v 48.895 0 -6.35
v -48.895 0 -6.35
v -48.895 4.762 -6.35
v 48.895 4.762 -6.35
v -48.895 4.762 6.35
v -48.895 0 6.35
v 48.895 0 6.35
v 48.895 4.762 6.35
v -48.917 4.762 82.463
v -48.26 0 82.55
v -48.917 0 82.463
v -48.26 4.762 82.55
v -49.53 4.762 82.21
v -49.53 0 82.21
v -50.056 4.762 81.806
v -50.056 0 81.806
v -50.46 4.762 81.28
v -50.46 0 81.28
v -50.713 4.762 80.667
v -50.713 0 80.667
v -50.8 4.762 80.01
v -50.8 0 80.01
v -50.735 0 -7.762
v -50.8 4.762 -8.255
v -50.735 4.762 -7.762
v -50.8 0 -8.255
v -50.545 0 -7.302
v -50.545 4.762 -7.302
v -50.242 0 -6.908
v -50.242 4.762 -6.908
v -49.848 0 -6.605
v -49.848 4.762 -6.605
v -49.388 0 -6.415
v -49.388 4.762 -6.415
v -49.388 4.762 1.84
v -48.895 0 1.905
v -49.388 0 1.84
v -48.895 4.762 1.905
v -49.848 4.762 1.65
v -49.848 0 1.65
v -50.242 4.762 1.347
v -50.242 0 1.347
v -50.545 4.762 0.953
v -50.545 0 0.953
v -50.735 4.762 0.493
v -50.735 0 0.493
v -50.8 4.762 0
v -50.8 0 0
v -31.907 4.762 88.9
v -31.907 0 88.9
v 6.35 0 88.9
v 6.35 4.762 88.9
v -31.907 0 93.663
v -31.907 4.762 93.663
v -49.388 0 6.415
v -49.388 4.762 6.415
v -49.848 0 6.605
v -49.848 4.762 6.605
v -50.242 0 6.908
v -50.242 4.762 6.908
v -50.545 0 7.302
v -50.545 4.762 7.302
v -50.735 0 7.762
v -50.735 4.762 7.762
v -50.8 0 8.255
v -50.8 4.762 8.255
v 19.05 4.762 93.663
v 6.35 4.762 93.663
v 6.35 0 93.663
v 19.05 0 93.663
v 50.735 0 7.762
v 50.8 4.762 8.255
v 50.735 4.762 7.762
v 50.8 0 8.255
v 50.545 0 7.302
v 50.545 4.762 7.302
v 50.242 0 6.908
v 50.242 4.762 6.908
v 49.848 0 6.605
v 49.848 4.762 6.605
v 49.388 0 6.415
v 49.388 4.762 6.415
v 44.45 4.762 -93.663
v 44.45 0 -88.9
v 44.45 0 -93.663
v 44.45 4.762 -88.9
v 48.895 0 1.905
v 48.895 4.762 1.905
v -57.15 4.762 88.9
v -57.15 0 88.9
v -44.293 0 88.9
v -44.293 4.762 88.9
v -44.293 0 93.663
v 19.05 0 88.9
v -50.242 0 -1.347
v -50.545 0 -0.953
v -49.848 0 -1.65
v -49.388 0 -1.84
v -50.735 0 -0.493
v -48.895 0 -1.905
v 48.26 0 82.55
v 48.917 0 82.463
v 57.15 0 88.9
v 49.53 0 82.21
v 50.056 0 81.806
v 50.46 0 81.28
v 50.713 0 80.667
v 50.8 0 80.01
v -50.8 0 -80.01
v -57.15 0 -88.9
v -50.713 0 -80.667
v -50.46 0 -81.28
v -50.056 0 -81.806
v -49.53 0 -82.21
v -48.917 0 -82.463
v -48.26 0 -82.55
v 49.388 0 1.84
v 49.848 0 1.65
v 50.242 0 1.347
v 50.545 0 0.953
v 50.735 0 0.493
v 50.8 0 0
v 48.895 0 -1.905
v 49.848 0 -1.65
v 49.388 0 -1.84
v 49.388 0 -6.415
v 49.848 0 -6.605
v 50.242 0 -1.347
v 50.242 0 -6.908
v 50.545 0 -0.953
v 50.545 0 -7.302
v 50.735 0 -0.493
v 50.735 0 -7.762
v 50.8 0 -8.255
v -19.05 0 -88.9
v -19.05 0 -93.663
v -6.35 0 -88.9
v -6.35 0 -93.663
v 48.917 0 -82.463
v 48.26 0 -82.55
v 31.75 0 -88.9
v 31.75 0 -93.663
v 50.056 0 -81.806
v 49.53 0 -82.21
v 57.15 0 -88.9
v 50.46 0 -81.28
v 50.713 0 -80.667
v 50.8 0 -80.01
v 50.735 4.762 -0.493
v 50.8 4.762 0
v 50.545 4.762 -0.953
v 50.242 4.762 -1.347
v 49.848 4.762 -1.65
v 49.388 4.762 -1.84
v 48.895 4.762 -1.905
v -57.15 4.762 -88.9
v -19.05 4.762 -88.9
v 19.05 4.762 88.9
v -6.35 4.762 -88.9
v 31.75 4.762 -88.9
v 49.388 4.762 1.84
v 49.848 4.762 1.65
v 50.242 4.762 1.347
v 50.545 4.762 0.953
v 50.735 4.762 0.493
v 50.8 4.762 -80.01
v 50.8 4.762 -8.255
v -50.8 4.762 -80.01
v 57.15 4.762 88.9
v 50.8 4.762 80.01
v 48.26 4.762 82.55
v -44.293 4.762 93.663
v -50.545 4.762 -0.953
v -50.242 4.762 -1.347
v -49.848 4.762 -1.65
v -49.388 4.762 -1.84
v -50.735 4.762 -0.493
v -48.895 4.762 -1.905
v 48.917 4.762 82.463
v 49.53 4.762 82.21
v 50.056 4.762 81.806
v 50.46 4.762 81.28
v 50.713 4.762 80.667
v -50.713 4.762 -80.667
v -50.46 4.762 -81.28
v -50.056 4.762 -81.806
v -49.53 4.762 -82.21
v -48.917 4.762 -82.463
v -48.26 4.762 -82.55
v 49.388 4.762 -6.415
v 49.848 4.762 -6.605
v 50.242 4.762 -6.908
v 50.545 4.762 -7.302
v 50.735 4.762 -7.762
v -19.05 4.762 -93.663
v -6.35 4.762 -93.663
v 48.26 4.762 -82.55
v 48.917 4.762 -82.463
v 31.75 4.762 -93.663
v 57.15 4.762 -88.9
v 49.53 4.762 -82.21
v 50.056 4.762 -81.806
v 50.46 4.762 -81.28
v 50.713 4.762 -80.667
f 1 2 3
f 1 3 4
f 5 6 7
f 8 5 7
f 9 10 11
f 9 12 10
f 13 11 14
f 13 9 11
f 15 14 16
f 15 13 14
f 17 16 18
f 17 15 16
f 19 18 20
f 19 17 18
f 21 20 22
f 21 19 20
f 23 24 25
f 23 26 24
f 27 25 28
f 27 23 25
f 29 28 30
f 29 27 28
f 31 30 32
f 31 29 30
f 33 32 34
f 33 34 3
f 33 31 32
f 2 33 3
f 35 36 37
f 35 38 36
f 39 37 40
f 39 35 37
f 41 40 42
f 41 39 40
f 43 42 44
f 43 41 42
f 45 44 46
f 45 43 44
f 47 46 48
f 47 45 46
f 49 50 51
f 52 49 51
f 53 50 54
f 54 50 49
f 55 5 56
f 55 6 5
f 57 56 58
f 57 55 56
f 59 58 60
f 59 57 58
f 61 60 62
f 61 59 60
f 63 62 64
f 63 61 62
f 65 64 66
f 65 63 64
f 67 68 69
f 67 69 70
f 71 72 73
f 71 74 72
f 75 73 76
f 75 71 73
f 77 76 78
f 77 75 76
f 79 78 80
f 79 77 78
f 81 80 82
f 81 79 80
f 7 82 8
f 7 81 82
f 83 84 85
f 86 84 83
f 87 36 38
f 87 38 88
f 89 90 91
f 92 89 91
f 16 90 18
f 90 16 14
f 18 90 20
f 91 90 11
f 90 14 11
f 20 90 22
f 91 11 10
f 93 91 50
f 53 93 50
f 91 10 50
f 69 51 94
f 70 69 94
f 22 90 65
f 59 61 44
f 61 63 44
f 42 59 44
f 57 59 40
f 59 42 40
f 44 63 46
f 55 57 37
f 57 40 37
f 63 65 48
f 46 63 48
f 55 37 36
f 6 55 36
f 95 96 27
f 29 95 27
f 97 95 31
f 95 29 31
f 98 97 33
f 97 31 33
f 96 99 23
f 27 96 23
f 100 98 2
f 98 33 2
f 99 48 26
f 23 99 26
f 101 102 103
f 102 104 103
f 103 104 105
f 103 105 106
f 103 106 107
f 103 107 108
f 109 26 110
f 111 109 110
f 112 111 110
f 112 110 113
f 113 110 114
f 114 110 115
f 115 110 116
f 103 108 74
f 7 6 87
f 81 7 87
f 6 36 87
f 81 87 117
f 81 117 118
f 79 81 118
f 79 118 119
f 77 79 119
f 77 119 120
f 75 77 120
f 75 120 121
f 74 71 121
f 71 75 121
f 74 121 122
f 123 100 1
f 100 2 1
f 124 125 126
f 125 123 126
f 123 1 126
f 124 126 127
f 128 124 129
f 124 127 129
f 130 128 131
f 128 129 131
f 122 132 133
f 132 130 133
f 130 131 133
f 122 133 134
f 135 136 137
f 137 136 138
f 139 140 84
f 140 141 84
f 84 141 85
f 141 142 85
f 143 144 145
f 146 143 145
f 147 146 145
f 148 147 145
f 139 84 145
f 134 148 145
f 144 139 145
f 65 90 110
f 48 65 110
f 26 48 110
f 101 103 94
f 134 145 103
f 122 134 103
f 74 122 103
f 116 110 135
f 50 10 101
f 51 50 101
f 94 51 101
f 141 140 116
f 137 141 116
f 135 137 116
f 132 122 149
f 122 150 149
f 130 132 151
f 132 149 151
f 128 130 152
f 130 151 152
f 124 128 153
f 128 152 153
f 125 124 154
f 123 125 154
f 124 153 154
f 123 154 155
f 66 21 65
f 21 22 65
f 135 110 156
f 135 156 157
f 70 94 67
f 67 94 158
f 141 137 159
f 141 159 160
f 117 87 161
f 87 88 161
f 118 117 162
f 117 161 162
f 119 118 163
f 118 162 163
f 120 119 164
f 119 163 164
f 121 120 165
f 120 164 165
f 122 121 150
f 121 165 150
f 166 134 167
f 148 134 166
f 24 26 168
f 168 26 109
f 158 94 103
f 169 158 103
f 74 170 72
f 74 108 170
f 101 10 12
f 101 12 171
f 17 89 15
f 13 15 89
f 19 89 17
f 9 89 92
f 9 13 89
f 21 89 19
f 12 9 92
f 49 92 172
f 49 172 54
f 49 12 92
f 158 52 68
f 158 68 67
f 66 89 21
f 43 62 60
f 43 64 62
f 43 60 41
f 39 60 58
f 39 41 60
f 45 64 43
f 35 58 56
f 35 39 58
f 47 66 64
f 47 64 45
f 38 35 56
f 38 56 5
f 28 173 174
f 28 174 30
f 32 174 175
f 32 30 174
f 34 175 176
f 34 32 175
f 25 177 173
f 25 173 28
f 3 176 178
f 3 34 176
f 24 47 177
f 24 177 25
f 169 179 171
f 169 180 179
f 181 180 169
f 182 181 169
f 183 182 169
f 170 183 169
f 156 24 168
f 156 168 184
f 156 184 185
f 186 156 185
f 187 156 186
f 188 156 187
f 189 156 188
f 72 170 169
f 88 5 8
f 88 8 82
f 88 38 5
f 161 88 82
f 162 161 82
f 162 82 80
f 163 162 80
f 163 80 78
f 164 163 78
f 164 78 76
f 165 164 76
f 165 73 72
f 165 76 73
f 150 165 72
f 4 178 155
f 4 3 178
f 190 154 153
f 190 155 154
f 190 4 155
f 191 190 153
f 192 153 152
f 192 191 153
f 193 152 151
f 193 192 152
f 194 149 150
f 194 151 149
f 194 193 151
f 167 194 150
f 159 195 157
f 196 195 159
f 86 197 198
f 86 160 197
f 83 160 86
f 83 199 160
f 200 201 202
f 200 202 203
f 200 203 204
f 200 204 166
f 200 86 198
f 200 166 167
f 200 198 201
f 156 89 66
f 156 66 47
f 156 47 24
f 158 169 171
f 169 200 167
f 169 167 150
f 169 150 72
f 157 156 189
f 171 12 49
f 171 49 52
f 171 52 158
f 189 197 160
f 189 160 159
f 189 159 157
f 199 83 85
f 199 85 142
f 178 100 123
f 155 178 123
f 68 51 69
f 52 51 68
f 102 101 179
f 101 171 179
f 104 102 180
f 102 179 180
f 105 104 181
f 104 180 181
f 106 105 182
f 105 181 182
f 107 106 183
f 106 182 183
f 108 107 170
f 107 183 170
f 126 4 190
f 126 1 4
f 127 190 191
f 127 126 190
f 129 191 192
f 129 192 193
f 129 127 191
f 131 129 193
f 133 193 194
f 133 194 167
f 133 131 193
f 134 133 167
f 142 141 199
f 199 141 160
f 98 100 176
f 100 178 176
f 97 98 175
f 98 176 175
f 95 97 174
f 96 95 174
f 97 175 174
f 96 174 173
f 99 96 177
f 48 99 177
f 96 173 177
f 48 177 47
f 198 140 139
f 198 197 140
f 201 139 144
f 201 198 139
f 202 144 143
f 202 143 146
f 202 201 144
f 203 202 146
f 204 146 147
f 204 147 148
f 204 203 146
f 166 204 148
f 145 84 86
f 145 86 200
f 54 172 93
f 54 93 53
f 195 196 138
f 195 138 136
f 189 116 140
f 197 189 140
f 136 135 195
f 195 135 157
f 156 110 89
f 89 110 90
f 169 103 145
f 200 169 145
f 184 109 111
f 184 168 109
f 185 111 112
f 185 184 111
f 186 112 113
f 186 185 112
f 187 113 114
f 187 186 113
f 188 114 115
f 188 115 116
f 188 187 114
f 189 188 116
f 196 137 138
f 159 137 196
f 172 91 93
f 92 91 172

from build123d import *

# Parameters (mm, degrees)
SKETCH1_W           = 114.3
SKETCH1_H           = 177.8
SKETCH1_W_2         = 101.6
SKETCH1_H_2         = 165.1
BOSS_EXTRUDE1_DEPTH = 4.7625
SKETCH2_W           = 12.38677804
SKETCH2_H           = 4.7625
SKETCH2_W_2         = 12.7
BOSS_EXTRUDE2_DEPTH = 4.7625
SKETCH3_W           = 12.7
SKETCH3_H           = 4.7625
BOSS_EXTRUDE3_DEPTH = 4.7625
FILLET1_R           = 2.54
SKETCH5_W           = 114.3
SKETCH5_H           = 12.7
SKETCH5_W_2         = 101.6
SKETCH5_H_2         = 3.81
BOSS_EXTRUDE5_DEPTH = 4.7625
FILLET3_R           = 1.905


with BuildPart() as part:
    # Sketch1 → Boss-Extrude1 (new body)
    with BuildSketch(Plane(origin=(0, 0, 0), x_dir=(1, 0, 0), z_dir=(0, 1, 0))):
        Rectangle(SKETCH1_W, SKETCH1_H)
        Rectangle(SKETCH1_W_2, SKETCH1_H_2, mode=Mode.SUBTRACT)
    extrude(amount=BOSS_EXTRUDE1_DEPTH)

    # Sketch2 → Boss-Extrude2 (add)
    with BuildSketch(Plane.XY.offset(88.9)):
        with Locations((-38.1, 2.38125)):
            Rectangle(SKETCH2_W, SKETCH2_H)
        with Locations((12.7, 2.38125)):
            Rectangle(SKETCH2_W_2, SKETCH2_H)
    extrude(amount=BOSS_EXTRUDE2_DEPTH)

    # Sketch3 → Boss-Extrude3 (add)
    with BuildSketch(Plane(origin=(0, 0, -88.9), x_dir=(-1, 0, 0), z_dir=(0, 0, -1))):
        with Locations((-38.1, 2.38125)):
            Rectangle(SKETCH3_W, SKETCH3_H)
        with Locations((12.7, 2.38125)):
            Rectangle(SKETCH3_W, SKETCH3_H)
    extrude(amount=BOSS_EXTRUDE3_DEPTH)

    # Fillet1
    fillet1_edges = [part.edges().sort_by_distance(p)[0] for p in [
        (50.8, 2.38125, 82.55),
        (50.8, 2.38125, -82.55),
        (-50.8, 2.38125, -82.55),
        (-50.8, 2.38125, 82.55),
    ]]
    fillet(fillet1_edges, radius=FILLET1_R)

    # Sketch5 → Boss-Extrude5 (add)
    with BuildSketch(Plane.XZ):
        Rectangle(SKETCH5_W, SKETCH5_H)
        Rectangle(SKETCH5_W_2, SKETCH5_H_2, mode=Mode.SUBTRACT)
    extrude(amount=-BOSS_EXTRUDE5_DEPTH)

    # Fillet3
    fillet3_edges = [part.edges().sort_by_distance(p)[0] for p in [
        (-50.8, 2.38125, 6.35),
        (-50.8, 2.38125, -6.35),
        (50.8, 2.38125, -6.35),
        (50.8, 2.38125, 6.35),
        (50.8, 2.38125, -1.905),
        (-50.8, 2.38125, -1.905),
        (-50.8, 2.38125, 1.905),
        (50.8, 2.38125, 1.905),
    ]]
    fillet(fillet3_edges, radius=FILLET3_R - 0.0001)  # a hair under: the kernel refuses the full size


solid = part.part
